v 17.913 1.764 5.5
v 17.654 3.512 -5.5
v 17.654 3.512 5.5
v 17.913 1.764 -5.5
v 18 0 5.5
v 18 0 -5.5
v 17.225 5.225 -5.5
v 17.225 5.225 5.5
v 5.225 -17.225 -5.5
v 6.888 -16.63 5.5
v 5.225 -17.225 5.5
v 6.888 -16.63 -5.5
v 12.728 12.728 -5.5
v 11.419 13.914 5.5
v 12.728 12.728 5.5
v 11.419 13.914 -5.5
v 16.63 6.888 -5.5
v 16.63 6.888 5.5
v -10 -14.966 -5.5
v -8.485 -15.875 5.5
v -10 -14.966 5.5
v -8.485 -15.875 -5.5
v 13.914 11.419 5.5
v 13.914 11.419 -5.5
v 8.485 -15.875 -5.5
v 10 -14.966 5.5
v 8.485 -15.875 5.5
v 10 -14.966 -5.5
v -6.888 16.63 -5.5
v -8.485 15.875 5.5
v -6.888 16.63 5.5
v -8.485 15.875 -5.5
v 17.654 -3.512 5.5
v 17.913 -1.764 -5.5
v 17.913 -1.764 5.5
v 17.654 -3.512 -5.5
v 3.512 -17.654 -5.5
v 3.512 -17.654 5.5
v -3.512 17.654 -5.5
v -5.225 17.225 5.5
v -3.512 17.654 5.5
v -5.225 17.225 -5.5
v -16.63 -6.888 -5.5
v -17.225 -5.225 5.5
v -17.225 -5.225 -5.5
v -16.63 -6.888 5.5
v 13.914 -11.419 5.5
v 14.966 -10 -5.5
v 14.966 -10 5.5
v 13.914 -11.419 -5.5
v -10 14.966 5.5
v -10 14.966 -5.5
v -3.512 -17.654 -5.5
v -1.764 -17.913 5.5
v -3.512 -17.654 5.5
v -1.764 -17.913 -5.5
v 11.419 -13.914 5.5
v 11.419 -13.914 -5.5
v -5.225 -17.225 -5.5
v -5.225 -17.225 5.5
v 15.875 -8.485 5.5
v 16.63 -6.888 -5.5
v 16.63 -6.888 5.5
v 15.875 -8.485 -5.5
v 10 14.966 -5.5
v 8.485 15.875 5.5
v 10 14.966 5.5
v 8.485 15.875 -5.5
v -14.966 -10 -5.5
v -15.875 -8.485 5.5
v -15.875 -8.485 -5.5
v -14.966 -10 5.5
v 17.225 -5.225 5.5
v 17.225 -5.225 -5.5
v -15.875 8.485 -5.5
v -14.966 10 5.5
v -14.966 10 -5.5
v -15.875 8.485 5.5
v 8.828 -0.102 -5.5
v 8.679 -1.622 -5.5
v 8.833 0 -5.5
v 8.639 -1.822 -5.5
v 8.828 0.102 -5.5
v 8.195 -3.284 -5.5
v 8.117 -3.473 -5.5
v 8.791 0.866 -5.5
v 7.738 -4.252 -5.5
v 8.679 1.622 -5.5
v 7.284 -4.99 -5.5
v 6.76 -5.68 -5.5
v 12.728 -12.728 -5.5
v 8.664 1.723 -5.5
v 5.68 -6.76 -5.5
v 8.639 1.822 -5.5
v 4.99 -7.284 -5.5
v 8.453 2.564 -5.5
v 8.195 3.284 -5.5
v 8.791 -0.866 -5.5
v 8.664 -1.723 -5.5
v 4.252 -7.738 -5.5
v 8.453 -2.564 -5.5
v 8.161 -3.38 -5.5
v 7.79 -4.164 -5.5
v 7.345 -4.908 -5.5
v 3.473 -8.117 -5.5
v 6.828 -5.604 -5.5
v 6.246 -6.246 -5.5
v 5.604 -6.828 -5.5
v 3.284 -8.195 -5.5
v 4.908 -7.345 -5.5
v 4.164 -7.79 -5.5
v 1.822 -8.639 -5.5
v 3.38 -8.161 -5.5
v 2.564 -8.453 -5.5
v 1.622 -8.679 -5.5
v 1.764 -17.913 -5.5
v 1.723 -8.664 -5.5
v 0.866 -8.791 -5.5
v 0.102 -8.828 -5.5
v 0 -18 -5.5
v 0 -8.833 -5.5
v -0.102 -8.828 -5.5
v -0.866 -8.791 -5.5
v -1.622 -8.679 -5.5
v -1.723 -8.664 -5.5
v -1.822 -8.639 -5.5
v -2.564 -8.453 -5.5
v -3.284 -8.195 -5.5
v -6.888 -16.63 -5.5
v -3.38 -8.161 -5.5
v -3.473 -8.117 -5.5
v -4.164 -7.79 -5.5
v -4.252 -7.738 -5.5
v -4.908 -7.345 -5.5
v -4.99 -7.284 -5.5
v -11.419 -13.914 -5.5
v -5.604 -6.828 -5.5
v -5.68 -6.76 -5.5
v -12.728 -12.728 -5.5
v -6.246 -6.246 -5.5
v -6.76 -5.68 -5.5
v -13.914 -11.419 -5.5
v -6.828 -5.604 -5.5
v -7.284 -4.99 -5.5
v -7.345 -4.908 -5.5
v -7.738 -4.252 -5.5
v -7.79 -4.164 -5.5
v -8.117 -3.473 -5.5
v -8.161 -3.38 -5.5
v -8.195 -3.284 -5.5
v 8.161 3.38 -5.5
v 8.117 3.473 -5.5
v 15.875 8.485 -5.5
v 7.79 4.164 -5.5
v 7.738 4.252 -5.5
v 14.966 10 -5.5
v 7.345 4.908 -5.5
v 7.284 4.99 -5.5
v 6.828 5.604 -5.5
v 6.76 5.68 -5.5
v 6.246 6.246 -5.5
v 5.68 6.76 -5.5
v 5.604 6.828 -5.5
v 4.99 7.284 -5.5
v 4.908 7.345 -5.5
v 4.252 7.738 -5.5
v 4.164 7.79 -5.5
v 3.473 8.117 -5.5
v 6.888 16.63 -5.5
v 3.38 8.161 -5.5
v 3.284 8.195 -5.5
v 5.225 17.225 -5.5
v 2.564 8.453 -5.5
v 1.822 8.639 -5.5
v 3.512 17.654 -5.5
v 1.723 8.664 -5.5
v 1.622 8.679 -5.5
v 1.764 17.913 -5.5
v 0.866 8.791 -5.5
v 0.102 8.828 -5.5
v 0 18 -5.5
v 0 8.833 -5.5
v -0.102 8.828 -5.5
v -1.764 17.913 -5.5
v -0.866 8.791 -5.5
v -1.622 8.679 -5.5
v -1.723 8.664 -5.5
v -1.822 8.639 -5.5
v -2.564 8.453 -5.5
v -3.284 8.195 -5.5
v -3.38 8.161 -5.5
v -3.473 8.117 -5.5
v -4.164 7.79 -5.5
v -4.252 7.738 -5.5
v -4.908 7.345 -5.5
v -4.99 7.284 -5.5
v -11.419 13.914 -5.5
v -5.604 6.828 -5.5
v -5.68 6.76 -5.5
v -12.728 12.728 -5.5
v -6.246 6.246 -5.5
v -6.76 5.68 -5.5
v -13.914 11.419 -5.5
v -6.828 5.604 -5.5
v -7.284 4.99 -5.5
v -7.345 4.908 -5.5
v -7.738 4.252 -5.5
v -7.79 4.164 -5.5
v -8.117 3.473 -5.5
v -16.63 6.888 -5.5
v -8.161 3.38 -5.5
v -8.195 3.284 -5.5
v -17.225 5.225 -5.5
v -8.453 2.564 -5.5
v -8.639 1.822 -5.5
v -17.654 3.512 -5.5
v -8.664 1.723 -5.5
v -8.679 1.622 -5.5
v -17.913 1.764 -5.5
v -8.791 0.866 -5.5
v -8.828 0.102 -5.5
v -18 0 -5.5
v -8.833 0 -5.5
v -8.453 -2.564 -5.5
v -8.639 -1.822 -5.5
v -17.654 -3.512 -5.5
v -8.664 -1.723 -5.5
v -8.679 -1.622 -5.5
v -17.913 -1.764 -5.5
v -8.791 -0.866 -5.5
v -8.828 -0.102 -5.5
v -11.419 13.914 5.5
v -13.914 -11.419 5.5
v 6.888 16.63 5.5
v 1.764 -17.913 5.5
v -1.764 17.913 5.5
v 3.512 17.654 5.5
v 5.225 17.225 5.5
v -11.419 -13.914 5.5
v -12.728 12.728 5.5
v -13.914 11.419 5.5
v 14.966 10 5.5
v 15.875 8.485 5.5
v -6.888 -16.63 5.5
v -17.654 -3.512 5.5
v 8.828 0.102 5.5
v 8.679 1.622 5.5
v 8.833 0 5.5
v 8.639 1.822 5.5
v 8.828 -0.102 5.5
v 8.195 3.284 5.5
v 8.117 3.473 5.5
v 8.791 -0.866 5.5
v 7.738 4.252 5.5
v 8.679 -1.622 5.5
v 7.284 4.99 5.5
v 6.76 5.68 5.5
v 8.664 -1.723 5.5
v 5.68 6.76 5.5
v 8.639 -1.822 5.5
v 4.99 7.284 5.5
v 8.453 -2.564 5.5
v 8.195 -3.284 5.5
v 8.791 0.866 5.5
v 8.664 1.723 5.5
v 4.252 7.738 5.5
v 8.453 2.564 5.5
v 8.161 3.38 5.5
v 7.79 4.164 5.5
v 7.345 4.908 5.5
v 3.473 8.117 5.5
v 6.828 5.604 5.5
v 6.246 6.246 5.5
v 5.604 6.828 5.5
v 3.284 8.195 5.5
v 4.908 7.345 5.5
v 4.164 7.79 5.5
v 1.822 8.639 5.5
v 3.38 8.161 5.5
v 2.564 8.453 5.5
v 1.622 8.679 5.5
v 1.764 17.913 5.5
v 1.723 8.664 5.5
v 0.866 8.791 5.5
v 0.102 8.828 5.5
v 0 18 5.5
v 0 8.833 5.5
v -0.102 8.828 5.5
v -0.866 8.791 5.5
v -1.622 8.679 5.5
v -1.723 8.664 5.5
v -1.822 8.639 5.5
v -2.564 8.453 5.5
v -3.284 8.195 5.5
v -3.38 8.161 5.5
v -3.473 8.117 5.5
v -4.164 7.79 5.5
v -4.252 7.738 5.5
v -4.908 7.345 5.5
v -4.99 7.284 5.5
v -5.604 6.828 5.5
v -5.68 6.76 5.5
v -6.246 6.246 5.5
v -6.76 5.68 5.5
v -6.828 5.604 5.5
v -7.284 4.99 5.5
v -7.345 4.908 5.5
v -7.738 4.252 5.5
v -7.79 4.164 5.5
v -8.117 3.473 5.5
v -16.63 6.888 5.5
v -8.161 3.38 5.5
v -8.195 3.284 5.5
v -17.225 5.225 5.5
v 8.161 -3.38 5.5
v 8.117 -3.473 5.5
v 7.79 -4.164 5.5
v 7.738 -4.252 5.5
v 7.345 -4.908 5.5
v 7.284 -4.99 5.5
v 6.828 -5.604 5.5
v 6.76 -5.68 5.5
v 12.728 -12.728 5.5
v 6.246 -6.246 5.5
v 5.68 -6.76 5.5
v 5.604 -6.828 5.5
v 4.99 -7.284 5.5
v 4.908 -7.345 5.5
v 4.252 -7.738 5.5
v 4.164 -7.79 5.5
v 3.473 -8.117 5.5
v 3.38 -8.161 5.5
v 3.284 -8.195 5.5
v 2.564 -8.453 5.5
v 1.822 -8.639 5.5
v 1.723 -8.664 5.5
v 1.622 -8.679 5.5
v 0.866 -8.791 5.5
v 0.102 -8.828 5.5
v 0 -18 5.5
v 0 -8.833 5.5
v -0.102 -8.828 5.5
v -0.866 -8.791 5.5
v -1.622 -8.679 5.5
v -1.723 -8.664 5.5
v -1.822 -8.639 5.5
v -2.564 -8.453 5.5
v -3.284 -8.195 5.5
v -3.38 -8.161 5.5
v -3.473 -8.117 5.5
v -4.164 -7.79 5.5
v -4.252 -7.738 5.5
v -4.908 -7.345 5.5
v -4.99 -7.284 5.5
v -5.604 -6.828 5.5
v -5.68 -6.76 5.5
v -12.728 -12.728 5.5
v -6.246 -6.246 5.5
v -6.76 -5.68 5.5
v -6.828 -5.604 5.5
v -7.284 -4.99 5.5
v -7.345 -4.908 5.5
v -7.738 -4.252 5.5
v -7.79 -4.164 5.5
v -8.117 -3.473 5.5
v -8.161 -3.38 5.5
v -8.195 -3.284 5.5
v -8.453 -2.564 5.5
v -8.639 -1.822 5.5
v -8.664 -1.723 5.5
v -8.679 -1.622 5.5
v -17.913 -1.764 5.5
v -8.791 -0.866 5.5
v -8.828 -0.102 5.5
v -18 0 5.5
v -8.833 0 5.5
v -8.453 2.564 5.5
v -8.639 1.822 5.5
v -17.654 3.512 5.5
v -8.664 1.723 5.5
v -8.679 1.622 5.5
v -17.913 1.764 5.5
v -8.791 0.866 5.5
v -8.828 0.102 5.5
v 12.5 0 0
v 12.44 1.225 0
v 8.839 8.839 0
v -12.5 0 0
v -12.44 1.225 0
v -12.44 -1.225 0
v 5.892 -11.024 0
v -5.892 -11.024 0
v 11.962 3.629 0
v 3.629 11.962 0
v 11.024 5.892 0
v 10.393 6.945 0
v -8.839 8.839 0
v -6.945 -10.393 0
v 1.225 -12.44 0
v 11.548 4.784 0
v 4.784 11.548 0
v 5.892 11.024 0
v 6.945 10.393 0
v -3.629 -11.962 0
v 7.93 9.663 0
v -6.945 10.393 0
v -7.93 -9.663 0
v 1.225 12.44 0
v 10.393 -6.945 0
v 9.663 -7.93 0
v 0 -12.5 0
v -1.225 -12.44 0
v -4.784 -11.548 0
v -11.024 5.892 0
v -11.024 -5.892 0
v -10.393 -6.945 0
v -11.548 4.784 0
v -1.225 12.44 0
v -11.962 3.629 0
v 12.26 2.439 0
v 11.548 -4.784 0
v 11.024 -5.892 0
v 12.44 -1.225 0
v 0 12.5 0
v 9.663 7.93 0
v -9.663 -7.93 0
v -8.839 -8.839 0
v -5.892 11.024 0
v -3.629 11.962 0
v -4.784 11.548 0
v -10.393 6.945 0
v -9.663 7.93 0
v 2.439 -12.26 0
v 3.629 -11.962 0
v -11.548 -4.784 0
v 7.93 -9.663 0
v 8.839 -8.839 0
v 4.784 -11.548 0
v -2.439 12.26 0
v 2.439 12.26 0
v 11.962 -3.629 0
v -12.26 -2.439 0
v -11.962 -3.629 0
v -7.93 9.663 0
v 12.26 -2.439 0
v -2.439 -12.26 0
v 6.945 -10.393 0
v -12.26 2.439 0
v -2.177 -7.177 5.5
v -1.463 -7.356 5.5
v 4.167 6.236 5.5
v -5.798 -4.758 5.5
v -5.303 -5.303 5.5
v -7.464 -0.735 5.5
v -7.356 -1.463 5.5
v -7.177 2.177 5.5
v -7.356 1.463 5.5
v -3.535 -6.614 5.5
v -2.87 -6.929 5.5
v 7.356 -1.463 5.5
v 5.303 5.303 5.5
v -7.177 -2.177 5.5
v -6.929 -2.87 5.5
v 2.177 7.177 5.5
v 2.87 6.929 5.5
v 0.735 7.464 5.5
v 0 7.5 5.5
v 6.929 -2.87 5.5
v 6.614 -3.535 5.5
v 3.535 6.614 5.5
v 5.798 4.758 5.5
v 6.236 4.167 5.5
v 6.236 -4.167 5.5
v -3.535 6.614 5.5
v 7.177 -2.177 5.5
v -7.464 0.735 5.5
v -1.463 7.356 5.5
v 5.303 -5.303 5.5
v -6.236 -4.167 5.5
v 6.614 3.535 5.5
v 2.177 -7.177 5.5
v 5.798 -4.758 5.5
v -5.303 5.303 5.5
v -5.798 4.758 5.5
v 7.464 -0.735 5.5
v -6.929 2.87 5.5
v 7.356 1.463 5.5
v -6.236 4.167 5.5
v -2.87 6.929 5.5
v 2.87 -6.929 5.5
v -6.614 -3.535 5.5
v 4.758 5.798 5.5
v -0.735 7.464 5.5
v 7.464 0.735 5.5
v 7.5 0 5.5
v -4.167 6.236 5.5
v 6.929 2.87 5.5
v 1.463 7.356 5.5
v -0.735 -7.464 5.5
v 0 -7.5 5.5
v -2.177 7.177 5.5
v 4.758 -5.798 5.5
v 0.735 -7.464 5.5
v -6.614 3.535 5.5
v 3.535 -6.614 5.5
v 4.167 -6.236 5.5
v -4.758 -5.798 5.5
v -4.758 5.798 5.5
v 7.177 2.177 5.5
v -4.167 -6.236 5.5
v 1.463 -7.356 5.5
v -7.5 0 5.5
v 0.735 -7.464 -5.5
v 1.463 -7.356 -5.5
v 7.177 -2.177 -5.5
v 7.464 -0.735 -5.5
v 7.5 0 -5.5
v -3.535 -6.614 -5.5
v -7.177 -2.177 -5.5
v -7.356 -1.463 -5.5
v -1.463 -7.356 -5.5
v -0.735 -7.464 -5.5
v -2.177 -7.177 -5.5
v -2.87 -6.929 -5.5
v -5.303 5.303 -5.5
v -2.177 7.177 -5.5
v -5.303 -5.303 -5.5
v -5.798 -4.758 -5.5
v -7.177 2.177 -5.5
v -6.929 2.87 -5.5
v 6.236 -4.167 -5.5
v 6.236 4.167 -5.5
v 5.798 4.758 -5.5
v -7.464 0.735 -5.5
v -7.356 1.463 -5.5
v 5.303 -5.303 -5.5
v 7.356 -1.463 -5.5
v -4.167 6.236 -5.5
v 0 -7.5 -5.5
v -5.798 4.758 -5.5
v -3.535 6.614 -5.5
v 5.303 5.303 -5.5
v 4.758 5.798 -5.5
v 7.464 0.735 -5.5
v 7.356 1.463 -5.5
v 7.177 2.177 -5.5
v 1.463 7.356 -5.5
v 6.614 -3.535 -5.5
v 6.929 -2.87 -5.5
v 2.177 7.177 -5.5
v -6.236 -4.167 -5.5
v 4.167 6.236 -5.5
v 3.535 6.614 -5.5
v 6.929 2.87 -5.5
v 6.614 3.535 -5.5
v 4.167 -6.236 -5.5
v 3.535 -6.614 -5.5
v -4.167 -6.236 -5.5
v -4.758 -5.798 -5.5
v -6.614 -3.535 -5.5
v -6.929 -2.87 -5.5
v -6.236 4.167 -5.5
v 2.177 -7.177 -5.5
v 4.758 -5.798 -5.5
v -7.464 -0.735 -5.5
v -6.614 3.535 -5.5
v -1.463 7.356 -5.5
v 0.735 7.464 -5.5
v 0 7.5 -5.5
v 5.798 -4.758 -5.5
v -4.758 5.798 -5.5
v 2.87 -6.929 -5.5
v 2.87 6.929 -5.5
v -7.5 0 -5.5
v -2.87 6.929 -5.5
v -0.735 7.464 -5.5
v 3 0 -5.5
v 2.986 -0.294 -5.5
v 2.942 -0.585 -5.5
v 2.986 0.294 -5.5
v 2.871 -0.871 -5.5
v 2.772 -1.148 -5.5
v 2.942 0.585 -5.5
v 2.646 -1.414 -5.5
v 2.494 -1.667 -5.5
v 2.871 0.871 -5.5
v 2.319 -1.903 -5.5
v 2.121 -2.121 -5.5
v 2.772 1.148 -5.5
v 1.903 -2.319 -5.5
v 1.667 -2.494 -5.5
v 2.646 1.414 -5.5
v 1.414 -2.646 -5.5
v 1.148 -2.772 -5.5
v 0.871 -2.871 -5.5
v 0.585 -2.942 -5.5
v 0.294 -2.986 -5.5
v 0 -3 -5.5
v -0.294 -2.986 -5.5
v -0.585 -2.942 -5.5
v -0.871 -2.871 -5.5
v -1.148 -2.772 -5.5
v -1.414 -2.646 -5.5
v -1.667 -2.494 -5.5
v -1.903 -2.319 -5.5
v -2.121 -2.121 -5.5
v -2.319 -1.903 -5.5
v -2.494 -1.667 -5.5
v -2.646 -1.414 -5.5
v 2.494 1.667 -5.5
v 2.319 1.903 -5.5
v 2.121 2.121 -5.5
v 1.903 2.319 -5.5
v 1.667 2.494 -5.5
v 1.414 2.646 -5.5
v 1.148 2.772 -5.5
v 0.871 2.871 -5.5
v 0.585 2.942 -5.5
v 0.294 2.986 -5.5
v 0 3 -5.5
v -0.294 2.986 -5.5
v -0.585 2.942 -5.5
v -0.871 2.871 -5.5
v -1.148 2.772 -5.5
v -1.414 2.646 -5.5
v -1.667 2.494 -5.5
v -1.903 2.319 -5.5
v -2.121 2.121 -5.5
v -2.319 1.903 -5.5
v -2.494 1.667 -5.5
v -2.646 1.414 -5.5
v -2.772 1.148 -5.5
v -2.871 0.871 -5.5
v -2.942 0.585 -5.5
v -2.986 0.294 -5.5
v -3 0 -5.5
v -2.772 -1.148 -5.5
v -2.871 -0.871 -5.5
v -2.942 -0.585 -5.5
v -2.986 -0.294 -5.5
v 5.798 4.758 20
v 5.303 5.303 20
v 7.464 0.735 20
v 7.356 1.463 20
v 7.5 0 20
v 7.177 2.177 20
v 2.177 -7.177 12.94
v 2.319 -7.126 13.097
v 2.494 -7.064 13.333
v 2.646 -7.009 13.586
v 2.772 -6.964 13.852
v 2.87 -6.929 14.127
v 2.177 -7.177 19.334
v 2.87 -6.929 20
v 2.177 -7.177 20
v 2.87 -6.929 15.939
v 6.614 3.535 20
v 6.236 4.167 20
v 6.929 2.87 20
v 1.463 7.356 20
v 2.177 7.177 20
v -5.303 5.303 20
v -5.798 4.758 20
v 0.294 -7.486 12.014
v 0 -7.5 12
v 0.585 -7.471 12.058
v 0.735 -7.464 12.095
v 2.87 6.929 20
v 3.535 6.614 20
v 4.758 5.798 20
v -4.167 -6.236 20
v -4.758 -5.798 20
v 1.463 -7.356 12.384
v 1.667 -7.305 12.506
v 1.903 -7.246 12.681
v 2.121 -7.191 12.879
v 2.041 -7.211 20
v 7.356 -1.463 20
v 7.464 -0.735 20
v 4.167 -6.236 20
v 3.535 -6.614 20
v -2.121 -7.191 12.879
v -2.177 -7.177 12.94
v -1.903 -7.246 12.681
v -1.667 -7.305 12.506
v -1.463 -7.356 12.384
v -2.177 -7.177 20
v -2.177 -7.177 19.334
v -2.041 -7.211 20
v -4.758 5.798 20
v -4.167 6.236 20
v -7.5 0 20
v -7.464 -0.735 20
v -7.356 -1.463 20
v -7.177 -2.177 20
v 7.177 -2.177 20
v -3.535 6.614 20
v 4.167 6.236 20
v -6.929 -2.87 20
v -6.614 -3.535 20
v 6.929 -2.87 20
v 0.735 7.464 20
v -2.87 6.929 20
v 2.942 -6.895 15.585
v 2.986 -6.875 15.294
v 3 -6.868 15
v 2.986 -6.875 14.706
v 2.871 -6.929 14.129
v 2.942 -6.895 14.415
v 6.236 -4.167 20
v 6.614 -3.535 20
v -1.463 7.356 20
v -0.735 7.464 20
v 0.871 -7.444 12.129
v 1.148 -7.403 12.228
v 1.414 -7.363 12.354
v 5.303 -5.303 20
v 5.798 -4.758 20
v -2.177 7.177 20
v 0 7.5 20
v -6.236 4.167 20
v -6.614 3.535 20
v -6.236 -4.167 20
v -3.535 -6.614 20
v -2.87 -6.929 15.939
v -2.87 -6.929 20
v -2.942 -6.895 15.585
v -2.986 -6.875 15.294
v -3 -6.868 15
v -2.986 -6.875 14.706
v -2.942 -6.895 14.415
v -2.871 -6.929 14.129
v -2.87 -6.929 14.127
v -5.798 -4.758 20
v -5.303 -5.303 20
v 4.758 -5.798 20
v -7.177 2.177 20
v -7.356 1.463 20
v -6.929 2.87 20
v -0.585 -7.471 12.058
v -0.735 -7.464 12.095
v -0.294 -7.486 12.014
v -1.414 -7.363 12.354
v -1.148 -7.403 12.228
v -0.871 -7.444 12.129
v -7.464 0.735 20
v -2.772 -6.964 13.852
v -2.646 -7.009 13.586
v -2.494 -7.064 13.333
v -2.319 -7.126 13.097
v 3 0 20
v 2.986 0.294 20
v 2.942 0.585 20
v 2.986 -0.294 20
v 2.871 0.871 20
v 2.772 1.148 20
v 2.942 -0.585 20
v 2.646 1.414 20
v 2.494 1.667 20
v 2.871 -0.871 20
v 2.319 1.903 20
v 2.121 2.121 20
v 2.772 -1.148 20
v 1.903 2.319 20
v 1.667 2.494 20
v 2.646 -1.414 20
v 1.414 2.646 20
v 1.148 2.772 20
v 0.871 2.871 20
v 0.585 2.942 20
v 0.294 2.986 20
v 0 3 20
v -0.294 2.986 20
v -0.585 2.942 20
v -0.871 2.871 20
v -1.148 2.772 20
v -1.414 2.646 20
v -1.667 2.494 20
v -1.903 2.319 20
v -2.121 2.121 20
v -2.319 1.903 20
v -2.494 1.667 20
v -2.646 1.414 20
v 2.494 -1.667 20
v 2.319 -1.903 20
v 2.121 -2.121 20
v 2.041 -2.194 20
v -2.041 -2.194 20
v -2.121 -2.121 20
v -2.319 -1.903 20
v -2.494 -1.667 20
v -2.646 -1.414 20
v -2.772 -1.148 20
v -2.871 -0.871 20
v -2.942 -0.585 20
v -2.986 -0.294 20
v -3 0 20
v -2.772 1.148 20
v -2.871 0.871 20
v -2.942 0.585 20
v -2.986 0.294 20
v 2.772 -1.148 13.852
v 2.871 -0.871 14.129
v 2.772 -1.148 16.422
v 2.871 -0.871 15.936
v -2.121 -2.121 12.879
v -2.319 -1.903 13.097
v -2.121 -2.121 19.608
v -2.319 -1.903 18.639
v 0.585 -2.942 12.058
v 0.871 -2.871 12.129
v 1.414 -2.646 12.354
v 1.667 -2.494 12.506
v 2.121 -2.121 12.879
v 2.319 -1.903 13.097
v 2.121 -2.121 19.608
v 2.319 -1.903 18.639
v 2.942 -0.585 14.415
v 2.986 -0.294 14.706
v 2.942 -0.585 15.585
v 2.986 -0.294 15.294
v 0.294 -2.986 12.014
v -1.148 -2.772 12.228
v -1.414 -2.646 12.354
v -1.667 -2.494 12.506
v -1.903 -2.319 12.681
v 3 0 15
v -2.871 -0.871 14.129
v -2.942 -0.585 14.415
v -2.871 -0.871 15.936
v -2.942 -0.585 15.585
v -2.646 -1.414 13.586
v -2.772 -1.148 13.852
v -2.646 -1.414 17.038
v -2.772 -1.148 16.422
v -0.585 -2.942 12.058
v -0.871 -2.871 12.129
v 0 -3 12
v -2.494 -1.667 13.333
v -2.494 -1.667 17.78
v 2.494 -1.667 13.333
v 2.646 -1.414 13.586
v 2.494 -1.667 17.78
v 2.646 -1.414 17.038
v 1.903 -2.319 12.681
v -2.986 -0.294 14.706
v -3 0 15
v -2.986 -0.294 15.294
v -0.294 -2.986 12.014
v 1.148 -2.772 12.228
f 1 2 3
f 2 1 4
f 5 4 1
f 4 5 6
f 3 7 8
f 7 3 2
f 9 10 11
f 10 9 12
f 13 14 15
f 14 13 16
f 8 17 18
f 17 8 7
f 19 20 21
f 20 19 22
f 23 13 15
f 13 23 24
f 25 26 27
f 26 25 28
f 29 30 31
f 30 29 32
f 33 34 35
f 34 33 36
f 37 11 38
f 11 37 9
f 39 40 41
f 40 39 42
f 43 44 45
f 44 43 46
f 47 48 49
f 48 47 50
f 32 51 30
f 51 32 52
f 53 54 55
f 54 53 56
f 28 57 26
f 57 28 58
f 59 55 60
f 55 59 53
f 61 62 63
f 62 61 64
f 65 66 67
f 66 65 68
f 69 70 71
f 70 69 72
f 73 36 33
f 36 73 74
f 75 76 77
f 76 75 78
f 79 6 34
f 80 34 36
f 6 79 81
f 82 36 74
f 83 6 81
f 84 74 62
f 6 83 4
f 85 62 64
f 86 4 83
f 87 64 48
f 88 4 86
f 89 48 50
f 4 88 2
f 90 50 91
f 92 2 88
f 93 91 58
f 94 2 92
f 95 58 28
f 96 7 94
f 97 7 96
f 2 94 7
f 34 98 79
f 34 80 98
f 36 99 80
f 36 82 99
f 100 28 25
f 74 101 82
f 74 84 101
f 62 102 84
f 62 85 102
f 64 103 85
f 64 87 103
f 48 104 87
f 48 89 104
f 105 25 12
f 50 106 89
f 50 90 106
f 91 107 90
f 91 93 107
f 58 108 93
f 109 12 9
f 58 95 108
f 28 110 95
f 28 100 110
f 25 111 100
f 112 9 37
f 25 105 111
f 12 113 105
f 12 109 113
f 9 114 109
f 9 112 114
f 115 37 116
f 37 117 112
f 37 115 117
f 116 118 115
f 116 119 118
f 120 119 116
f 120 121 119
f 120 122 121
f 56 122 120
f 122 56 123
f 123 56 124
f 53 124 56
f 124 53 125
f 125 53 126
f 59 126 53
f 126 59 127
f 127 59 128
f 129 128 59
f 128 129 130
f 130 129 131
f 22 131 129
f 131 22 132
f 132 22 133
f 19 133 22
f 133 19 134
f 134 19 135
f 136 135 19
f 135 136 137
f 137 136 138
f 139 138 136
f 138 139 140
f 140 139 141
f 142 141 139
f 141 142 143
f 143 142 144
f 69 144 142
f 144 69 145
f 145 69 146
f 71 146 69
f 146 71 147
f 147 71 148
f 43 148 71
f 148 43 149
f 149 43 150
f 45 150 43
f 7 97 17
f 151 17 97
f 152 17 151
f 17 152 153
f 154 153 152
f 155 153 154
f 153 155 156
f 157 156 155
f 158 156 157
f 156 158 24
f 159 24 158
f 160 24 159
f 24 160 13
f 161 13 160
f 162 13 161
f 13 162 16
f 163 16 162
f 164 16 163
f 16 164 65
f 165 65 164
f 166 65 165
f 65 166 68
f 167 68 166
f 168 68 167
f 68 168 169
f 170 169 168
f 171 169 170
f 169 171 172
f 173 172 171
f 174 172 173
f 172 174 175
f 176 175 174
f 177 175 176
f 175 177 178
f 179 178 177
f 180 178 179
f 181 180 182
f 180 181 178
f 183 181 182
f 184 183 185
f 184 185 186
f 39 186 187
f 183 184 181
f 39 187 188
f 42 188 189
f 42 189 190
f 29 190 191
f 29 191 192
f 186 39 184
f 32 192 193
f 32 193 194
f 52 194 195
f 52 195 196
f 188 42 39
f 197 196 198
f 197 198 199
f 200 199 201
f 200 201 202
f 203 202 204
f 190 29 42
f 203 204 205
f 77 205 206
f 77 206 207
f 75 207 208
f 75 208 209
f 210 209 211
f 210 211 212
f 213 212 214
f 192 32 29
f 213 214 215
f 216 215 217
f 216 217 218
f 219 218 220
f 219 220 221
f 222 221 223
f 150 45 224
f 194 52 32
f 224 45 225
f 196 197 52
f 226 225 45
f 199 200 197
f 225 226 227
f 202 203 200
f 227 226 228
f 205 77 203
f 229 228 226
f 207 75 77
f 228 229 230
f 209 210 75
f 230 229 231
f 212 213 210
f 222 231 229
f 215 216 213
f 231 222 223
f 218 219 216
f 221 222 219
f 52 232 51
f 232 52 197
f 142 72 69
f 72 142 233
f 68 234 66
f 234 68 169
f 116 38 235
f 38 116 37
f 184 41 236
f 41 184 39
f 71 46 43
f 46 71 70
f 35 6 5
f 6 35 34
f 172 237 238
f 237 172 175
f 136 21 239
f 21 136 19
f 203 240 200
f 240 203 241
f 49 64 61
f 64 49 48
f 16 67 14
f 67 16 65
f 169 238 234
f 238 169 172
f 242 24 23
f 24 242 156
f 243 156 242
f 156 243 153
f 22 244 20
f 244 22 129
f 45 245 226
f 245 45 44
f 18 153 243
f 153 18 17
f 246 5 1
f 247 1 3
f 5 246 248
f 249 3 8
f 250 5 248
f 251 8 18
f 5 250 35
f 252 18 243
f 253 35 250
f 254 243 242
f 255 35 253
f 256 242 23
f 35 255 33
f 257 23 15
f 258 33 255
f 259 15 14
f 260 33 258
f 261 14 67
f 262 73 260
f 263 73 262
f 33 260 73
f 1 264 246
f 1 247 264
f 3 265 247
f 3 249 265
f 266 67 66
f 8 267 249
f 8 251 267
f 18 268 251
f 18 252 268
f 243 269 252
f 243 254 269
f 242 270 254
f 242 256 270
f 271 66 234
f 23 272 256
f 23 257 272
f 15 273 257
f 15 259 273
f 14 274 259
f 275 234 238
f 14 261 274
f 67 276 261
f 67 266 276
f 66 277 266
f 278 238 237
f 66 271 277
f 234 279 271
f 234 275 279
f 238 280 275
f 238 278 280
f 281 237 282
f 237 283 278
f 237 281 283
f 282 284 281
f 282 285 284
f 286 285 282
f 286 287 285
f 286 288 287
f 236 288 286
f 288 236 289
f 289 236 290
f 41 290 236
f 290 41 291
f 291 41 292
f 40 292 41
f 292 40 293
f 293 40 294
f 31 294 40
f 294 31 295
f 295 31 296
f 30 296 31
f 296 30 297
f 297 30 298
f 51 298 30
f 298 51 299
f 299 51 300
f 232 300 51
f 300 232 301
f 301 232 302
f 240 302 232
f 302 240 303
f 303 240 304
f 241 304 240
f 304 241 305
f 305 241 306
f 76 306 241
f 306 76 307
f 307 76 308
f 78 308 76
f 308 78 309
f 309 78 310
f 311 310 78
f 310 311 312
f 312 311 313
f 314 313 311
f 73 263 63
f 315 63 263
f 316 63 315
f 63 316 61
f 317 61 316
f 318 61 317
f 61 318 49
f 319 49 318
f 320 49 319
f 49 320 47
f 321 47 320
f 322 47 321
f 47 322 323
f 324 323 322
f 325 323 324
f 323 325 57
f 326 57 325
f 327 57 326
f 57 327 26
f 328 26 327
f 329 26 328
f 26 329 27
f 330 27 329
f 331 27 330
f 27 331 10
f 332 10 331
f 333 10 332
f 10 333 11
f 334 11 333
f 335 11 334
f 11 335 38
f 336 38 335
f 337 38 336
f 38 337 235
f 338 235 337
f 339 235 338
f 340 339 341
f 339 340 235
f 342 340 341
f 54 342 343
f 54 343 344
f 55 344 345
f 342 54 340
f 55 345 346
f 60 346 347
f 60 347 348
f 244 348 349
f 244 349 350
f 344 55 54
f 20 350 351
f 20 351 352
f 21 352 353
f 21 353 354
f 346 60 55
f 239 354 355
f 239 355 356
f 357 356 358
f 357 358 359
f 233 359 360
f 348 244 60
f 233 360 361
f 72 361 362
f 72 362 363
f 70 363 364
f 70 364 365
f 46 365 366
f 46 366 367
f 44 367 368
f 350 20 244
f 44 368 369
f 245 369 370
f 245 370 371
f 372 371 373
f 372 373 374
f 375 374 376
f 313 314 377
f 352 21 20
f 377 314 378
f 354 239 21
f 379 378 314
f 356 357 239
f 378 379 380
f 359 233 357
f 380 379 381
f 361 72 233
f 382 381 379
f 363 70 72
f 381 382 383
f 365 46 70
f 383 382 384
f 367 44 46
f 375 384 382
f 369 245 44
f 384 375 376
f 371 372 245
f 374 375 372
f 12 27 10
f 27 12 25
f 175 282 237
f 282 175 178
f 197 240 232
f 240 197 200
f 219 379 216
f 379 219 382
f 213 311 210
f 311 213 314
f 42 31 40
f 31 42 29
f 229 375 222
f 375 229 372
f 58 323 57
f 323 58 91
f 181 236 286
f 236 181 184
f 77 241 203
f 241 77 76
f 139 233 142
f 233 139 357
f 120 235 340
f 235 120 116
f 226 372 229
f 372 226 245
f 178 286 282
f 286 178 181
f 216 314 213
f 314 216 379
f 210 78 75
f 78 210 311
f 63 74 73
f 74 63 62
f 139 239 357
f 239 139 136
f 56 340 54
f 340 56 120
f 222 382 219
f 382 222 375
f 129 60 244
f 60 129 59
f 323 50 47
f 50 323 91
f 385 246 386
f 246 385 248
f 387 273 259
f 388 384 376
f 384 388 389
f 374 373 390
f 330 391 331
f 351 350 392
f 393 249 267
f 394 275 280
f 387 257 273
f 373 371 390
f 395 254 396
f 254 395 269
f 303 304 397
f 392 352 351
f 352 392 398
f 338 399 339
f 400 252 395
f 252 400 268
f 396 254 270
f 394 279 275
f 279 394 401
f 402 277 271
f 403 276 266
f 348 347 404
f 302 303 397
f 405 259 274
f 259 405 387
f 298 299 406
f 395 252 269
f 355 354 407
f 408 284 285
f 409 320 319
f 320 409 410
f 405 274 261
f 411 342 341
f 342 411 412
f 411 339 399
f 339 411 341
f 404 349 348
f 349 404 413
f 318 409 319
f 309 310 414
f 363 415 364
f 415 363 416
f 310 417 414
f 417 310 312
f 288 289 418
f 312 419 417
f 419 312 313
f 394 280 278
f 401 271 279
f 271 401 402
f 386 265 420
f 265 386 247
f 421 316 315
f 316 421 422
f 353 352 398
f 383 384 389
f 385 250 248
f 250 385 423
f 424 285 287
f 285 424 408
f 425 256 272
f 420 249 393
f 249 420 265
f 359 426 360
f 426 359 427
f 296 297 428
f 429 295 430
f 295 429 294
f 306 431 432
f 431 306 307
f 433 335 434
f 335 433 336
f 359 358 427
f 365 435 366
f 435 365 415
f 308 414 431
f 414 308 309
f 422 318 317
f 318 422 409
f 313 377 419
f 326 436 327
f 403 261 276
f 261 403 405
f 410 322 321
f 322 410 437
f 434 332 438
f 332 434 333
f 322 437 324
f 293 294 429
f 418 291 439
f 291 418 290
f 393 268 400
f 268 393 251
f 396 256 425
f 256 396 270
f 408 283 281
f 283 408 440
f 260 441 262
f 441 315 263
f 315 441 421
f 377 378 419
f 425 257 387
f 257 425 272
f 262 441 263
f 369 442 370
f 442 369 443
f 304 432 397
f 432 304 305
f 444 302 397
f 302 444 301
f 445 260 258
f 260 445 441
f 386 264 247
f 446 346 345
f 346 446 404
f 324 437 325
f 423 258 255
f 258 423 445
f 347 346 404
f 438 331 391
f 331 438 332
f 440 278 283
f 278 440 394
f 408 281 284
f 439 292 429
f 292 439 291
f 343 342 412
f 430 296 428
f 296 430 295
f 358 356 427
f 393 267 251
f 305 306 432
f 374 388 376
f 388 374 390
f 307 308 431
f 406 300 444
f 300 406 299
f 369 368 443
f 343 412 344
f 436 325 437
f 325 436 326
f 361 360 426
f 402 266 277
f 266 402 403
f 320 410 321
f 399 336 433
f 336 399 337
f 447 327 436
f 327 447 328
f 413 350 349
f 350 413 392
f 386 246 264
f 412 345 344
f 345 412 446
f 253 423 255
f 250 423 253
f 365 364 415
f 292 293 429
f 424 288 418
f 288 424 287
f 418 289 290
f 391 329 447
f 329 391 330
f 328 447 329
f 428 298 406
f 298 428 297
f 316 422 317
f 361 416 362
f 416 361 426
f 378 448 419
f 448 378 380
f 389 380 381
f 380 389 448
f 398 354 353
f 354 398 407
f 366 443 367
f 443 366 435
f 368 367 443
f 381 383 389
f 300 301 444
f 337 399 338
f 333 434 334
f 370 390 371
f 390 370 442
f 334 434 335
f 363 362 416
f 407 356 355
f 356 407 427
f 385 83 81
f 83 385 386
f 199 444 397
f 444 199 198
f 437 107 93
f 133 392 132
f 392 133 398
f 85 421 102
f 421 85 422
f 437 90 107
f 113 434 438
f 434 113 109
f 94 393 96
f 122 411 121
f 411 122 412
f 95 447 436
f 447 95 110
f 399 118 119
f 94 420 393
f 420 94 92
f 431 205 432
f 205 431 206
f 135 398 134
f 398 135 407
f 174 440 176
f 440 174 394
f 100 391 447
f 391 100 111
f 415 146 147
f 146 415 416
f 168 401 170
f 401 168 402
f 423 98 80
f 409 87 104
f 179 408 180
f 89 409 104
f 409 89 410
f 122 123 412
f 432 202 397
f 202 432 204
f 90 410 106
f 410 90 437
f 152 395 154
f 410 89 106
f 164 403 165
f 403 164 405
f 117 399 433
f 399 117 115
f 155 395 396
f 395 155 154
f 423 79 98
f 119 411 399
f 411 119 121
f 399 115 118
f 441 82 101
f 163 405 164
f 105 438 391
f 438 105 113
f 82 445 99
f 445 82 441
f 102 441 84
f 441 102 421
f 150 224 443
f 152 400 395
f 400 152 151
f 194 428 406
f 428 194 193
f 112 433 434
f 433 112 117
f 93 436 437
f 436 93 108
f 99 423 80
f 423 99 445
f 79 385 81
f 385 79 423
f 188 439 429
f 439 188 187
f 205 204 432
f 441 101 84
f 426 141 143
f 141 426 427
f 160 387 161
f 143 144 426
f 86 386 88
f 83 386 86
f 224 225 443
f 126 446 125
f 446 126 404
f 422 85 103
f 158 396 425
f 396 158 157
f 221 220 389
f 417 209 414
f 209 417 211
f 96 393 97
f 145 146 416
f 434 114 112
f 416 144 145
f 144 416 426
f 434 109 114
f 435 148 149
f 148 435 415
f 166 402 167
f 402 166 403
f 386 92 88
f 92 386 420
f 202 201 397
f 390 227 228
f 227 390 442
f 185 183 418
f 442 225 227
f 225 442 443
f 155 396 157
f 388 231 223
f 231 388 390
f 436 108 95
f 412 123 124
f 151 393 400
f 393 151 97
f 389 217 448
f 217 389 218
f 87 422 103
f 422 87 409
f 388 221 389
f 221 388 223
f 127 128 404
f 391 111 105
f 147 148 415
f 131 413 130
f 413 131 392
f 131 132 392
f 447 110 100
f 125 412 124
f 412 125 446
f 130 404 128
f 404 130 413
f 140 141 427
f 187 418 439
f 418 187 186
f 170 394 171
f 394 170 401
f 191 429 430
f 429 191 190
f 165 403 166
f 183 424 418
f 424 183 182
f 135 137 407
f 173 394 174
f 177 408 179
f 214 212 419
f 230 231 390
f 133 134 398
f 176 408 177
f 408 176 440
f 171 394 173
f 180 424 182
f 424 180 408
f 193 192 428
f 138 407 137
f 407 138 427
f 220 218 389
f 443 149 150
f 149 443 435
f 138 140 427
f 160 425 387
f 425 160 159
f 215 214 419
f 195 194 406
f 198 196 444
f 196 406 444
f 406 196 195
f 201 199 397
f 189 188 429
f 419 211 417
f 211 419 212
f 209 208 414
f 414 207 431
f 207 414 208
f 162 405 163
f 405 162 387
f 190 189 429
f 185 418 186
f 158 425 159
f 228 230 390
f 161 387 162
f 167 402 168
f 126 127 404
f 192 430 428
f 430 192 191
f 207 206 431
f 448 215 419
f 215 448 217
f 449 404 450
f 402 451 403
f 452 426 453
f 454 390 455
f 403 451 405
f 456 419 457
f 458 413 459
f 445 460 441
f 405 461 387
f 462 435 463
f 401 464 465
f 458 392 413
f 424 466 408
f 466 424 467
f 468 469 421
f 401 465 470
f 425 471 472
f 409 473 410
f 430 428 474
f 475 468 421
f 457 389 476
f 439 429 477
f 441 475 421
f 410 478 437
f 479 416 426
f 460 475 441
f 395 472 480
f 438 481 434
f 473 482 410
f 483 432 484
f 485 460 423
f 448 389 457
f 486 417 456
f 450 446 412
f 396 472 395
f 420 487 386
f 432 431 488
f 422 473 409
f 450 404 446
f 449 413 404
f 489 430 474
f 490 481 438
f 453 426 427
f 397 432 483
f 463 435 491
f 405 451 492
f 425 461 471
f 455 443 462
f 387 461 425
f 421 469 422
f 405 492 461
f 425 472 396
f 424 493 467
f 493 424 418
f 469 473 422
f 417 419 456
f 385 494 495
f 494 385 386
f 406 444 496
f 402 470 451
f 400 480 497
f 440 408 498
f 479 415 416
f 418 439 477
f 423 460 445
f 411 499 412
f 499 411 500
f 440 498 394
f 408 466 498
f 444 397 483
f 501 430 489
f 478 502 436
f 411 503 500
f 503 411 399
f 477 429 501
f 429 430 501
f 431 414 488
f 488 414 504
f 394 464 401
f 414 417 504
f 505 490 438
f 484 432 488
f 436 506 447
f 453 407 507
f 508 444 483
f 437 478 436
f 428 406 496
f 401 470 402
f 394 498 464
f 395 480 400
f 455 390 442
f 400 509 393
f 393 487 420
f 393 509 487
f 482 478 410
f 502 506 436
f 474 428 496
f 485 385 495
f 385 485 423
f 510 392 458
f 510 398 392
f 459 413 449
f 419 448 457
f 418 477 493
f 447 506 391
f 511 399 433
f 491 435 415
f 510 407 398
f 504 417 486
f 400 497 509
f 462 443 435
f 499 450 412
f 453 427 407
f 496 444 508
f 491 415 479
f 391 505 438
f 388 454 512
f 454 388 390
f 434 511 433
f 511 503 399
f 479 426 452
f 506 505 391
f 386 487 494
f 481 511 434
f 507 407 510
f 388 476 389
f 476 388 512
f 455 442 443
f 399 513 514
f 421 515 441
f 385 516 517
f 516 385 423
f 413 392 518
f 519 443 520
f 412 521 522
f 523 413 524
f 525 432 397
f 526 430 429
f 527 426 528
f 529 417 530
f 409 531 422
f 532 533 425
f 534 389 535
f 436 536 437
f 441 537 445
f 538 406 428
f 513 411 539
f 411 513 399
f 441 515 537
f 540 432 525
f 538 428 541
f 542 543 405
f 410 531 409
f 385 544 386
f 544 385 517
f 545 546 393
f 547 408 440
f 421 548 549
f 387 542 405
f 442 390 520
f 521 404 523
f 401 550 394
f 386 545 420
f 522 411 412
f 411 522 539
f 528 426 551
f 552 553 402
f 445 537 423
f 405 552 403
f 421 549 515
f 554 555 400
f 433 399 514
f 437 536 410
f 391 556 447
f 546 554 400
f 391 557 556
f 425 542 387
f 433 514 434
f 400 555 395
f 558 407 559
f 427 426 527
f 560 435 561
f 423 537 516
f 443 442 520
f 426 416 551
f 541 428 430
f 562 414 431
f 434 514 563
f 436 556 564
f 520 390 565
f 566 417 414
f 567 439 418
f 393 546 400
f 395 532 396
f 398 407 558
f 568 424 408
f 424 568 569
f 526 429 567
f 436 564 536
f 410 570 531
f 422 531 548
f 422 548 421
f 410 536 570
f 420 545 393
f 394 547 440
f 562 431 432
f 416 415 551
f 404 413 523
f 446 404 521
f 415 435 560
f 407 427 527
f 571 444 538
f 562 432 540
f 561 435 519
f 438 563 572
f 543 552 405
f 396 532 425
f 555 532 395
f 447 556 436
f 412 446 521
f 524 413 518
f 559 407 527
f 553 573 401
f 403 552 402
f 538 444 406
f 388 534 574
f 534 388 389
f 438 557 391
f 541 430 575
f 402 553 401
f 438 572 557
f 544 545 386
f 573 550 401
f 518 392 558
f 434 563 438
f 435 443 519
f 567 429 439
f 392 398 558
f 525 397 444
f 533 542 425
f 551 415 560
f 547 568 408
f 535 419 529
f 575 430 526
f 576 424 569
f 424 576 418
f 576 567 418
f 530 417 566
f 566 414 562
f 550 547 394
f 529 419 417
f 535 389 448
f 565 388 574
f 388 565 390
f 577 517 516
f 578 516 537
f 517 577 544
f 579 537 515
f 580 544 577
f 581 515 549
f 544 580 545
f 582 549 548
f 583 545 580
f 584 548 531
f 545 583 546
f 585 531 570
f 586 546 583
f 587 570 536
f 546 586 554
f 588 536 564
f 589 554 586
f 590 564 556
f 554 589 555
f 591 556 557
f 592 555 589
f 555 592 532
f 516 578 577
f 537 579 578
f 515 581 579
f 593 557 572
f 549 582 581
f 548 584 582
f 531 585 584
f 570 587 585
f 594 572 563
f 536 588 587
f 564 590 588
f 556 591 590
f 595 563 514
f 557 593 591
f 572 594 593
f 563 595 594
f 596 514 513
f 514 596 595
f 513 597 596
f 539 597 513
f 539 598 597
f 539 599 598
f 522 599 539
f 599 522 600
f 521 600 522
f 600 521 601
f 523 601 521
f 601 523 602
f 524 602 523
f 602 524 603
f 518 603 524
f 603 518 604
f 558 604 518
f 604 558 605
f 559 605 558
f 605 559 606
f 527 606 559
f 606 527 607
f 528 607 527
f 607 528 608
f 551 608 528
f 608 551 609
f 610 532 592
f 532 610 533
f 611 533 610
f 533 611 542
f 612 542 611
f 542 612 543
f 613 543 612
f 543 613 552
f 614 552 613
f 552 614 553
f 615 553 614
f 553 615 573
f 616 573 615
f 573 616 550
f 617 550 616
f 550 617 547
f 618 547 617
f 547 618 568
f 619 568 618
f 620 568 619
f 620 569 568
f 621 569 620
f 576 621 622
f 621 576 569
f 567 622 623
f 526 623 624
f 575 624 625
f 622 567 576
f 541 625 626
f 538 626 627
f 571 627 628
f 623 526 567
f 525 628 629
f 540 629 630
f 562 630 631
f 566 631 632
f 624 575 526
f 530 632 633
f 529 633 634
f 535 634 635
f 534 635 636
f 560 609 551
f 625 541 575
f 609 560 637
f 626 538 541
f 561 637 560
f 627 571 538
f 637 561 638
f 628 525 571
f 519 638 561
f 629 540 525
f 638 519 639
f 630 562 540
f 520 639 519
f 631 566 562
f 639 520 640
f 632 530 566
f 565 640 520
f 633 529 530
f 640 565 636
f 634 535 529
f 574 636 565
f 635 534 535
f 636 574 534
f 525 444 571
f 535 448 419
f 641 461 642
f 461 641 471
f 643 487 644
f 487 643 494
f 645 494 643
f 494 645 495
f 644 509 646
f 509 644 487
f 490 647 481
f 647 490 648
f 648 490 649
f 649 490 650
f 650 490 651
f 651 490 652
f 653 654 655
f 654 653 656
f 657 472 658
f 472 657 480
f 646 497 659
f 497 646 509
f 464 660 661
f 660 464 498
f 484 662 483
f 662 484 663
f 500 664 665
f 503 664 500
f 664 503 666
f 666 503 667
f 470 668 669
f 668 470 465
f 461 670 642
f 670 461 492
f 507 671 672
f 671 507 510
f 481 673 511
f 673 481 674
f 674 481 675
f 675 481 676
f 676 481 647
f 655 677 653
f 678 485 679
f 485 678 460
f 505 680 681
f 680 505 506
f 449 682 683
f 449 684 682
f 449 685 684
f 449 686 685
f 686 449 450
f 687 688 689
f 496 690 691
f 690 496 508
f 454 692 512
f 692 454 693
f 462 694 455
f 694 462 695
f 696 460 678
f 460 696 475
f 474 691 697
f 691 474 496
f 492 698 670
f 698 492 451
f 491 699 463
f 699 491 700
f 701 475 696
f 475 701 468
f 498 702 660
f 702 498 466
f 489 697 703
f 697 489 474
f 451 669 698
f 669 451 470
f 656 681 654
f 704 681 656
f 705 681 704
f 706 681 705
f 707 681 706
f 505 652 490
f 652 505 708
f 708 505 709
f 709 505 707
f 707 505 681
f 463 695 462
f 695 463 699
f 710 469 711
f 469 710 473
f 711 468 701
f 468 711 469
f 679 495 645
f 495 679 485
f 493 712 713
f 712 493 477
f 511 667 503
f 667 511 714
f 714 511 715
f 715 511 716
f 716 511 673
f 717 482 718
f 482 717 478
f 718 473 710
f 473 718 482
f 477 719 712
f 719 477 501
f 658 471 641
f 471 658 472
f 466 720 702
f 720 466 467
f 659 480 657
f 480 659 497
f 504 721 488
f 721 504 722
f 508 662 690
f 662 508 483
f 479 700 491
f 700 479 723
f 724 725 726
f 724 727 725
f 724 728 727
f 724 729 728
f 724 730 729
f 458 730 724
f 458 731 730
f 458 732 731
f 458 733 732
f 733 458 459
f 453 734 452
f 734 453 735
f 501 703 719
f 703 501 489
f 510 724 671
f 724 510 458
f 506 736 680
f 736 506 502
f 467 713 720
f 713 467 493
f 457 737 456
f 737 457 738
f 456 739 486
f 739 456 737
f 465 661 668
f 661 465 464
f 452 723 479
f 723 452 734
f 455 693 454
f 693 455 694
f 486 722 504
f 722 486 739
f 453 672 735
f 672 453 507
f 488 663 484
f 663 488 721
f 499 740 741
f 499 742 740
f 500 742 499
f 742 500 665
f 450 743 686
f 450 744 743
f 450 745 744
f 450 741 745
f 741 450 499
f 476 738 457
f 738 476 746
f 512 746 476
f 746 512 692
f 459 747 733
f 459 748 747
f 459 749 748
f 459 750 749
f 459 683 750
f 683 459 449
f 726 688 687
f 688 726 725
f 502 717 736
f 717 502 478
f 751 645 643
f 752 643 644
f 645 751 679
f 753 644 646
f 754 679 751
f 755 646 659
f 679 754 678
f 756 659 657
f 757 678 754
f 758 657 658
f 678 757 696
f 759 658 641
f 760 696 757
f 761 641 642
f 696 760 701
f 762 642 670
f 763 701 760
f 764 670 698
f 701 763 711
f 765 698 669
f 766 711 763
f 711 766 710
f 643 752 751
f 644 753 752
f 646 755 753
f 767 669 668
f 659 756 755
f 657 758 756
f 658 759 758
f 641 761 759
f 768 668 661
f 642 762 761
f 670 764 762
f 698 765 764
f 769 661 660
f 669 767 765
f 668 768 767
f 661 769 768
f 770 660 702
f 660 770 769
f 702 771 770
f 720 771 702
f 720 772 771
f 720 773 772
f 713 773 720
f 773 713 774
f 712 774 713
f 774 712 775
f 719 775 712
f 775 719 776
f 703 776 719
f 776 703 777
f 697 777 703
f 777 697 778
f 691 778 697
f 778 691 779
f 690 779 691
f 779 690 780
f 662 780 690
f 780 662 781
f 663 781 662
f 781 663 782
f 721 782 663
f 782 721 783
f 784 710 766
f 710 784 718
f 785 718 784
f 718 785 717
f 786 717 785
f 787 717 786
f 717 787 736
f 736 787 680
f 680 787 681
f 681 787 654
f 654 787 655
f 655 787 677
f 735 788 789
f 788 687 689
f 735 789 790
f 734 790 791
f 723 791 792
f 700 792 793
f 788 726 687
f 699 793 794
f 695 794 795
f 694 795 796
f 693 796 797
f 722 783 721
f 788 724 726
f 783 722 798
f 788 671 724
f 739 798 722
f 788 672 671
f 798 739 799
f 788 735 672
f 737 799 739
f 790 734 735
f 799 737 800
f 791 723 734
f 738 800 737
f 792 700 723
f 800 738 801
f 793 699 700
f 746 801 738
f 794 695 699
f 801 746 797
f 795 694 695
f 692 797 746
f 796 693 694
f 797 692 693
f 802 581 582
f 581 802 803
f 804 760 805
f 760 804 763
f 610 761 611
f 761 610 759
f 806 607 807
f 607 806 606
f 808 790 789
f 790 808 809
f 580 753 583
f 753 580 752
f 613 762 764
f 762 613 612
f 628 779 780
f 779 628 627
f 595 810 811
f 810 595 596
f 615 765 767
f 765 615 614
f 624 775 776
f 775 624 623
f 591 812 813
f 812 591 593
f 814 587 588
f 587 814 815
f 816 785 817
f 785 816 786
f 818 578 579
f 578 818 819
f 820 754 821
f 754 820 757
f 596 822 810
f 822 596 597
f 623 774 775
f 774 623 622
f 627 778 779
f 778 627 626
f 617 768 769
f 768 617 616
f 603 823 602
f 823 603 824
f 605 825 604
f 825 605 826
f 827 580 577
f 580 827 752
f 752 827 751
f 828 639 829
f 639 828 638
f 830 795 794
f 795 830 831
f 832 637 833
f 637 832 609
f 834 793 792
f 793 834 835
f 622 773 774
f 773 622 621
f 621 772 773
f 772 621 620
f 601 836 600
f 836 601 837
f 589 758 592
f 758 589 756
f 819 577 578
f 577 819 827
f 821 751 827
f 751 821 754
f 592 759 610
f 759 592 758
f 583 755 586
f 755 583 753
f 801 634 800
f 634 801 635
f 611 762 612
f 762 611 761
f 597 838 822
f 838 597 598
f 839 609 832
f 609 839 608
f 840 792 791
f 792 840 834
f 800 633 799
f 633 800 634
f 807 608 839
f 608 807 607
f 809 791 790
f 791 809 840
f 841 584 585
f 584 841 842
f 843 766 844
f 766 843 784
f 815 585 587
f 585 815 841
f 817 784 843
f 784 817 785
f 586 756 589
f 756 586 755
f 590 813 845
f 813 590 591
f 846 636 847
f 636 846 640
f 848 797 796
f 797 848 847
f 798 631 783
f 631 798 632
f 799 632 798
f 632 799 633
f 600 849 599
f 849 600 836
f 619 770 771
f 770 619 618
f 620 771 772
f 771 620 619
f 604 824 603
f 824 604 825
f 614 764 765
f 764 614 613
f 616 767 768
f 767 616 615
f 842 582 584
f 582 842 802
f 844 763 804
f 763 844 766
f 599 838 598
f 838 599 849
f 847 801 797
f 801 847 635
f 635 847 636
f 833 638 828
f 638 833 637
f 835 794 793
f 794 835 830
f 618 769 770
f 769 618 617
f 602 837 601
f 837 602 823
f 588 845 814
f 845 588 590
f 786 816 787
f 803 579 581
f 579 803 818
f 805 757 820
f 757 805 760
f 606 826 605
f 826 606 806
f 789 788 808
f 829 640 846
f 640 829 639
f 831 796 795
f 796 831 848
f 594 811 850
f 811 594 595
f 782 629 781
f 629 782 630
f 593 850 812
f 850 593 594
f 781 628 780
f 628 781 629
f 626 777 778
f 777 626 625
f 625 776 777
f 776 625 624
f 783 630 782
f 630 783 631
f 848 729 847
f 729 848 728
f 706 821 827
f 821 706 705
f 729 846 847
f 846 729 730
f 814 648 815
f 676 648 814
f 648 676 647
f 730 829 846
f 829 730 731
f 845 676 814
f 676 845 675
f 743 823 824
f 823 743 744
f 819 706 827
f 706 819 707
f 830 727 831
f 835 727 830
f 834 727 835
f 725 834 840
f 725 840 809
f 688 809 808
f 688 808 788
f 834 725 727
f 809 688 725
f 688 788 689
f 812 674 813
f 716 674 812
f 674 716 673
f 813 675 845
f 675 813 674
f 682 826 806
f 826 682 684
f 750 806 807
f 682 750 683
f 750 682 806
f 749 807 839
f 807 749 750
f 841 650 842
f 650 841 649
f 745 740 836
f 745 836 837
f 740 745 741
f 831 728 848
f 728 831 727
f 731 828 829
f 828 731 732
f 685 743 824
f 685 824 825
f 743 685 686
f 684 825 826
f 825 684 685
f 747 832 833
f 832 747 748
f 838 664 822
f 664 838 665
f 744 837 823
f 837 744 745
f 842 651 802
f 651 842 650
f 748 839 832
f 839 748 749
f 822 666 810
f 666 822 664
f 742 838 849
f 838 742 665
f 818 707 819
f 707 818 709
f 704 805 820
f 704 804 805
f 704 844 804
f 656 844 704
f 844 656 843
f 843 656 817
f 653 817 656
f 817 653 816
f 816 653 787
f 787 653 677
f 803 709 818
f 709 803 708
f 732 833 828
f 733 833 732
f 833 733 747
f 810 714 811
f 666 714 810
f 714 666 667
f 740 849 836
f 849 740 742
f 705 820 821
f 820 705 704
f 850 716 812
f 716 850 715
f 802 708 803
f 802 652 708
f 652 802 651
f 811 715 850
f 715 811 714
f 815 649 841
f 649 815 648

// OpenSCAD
$fn=64;
difference(){
cylinder(r=36/2,h=11,center=true);
cylinder(r1=25/2,r2=17/2,h=12/2);
mirror([0,0,1])cylinder(r1=25/2,r2=17/2,h=12/2);
}


difference(){
union(){
cylinder(r1=25/2,r2=15/2,h=11/2);
mirror([0,0,1])cylinder(r1=25/2,r2=15/2,h=11/2);
cylinder(r=15/2,h=20);
}
cylinder(r=6/2,h=80,center=true);
hull(){
translate([0,0,20-5])rotate([90,0,0])cylinder(r=6/2,h=10);
translate([0,0,20])rotate([90,0,0])cylinder(r=4/2,h=10);
}
}
